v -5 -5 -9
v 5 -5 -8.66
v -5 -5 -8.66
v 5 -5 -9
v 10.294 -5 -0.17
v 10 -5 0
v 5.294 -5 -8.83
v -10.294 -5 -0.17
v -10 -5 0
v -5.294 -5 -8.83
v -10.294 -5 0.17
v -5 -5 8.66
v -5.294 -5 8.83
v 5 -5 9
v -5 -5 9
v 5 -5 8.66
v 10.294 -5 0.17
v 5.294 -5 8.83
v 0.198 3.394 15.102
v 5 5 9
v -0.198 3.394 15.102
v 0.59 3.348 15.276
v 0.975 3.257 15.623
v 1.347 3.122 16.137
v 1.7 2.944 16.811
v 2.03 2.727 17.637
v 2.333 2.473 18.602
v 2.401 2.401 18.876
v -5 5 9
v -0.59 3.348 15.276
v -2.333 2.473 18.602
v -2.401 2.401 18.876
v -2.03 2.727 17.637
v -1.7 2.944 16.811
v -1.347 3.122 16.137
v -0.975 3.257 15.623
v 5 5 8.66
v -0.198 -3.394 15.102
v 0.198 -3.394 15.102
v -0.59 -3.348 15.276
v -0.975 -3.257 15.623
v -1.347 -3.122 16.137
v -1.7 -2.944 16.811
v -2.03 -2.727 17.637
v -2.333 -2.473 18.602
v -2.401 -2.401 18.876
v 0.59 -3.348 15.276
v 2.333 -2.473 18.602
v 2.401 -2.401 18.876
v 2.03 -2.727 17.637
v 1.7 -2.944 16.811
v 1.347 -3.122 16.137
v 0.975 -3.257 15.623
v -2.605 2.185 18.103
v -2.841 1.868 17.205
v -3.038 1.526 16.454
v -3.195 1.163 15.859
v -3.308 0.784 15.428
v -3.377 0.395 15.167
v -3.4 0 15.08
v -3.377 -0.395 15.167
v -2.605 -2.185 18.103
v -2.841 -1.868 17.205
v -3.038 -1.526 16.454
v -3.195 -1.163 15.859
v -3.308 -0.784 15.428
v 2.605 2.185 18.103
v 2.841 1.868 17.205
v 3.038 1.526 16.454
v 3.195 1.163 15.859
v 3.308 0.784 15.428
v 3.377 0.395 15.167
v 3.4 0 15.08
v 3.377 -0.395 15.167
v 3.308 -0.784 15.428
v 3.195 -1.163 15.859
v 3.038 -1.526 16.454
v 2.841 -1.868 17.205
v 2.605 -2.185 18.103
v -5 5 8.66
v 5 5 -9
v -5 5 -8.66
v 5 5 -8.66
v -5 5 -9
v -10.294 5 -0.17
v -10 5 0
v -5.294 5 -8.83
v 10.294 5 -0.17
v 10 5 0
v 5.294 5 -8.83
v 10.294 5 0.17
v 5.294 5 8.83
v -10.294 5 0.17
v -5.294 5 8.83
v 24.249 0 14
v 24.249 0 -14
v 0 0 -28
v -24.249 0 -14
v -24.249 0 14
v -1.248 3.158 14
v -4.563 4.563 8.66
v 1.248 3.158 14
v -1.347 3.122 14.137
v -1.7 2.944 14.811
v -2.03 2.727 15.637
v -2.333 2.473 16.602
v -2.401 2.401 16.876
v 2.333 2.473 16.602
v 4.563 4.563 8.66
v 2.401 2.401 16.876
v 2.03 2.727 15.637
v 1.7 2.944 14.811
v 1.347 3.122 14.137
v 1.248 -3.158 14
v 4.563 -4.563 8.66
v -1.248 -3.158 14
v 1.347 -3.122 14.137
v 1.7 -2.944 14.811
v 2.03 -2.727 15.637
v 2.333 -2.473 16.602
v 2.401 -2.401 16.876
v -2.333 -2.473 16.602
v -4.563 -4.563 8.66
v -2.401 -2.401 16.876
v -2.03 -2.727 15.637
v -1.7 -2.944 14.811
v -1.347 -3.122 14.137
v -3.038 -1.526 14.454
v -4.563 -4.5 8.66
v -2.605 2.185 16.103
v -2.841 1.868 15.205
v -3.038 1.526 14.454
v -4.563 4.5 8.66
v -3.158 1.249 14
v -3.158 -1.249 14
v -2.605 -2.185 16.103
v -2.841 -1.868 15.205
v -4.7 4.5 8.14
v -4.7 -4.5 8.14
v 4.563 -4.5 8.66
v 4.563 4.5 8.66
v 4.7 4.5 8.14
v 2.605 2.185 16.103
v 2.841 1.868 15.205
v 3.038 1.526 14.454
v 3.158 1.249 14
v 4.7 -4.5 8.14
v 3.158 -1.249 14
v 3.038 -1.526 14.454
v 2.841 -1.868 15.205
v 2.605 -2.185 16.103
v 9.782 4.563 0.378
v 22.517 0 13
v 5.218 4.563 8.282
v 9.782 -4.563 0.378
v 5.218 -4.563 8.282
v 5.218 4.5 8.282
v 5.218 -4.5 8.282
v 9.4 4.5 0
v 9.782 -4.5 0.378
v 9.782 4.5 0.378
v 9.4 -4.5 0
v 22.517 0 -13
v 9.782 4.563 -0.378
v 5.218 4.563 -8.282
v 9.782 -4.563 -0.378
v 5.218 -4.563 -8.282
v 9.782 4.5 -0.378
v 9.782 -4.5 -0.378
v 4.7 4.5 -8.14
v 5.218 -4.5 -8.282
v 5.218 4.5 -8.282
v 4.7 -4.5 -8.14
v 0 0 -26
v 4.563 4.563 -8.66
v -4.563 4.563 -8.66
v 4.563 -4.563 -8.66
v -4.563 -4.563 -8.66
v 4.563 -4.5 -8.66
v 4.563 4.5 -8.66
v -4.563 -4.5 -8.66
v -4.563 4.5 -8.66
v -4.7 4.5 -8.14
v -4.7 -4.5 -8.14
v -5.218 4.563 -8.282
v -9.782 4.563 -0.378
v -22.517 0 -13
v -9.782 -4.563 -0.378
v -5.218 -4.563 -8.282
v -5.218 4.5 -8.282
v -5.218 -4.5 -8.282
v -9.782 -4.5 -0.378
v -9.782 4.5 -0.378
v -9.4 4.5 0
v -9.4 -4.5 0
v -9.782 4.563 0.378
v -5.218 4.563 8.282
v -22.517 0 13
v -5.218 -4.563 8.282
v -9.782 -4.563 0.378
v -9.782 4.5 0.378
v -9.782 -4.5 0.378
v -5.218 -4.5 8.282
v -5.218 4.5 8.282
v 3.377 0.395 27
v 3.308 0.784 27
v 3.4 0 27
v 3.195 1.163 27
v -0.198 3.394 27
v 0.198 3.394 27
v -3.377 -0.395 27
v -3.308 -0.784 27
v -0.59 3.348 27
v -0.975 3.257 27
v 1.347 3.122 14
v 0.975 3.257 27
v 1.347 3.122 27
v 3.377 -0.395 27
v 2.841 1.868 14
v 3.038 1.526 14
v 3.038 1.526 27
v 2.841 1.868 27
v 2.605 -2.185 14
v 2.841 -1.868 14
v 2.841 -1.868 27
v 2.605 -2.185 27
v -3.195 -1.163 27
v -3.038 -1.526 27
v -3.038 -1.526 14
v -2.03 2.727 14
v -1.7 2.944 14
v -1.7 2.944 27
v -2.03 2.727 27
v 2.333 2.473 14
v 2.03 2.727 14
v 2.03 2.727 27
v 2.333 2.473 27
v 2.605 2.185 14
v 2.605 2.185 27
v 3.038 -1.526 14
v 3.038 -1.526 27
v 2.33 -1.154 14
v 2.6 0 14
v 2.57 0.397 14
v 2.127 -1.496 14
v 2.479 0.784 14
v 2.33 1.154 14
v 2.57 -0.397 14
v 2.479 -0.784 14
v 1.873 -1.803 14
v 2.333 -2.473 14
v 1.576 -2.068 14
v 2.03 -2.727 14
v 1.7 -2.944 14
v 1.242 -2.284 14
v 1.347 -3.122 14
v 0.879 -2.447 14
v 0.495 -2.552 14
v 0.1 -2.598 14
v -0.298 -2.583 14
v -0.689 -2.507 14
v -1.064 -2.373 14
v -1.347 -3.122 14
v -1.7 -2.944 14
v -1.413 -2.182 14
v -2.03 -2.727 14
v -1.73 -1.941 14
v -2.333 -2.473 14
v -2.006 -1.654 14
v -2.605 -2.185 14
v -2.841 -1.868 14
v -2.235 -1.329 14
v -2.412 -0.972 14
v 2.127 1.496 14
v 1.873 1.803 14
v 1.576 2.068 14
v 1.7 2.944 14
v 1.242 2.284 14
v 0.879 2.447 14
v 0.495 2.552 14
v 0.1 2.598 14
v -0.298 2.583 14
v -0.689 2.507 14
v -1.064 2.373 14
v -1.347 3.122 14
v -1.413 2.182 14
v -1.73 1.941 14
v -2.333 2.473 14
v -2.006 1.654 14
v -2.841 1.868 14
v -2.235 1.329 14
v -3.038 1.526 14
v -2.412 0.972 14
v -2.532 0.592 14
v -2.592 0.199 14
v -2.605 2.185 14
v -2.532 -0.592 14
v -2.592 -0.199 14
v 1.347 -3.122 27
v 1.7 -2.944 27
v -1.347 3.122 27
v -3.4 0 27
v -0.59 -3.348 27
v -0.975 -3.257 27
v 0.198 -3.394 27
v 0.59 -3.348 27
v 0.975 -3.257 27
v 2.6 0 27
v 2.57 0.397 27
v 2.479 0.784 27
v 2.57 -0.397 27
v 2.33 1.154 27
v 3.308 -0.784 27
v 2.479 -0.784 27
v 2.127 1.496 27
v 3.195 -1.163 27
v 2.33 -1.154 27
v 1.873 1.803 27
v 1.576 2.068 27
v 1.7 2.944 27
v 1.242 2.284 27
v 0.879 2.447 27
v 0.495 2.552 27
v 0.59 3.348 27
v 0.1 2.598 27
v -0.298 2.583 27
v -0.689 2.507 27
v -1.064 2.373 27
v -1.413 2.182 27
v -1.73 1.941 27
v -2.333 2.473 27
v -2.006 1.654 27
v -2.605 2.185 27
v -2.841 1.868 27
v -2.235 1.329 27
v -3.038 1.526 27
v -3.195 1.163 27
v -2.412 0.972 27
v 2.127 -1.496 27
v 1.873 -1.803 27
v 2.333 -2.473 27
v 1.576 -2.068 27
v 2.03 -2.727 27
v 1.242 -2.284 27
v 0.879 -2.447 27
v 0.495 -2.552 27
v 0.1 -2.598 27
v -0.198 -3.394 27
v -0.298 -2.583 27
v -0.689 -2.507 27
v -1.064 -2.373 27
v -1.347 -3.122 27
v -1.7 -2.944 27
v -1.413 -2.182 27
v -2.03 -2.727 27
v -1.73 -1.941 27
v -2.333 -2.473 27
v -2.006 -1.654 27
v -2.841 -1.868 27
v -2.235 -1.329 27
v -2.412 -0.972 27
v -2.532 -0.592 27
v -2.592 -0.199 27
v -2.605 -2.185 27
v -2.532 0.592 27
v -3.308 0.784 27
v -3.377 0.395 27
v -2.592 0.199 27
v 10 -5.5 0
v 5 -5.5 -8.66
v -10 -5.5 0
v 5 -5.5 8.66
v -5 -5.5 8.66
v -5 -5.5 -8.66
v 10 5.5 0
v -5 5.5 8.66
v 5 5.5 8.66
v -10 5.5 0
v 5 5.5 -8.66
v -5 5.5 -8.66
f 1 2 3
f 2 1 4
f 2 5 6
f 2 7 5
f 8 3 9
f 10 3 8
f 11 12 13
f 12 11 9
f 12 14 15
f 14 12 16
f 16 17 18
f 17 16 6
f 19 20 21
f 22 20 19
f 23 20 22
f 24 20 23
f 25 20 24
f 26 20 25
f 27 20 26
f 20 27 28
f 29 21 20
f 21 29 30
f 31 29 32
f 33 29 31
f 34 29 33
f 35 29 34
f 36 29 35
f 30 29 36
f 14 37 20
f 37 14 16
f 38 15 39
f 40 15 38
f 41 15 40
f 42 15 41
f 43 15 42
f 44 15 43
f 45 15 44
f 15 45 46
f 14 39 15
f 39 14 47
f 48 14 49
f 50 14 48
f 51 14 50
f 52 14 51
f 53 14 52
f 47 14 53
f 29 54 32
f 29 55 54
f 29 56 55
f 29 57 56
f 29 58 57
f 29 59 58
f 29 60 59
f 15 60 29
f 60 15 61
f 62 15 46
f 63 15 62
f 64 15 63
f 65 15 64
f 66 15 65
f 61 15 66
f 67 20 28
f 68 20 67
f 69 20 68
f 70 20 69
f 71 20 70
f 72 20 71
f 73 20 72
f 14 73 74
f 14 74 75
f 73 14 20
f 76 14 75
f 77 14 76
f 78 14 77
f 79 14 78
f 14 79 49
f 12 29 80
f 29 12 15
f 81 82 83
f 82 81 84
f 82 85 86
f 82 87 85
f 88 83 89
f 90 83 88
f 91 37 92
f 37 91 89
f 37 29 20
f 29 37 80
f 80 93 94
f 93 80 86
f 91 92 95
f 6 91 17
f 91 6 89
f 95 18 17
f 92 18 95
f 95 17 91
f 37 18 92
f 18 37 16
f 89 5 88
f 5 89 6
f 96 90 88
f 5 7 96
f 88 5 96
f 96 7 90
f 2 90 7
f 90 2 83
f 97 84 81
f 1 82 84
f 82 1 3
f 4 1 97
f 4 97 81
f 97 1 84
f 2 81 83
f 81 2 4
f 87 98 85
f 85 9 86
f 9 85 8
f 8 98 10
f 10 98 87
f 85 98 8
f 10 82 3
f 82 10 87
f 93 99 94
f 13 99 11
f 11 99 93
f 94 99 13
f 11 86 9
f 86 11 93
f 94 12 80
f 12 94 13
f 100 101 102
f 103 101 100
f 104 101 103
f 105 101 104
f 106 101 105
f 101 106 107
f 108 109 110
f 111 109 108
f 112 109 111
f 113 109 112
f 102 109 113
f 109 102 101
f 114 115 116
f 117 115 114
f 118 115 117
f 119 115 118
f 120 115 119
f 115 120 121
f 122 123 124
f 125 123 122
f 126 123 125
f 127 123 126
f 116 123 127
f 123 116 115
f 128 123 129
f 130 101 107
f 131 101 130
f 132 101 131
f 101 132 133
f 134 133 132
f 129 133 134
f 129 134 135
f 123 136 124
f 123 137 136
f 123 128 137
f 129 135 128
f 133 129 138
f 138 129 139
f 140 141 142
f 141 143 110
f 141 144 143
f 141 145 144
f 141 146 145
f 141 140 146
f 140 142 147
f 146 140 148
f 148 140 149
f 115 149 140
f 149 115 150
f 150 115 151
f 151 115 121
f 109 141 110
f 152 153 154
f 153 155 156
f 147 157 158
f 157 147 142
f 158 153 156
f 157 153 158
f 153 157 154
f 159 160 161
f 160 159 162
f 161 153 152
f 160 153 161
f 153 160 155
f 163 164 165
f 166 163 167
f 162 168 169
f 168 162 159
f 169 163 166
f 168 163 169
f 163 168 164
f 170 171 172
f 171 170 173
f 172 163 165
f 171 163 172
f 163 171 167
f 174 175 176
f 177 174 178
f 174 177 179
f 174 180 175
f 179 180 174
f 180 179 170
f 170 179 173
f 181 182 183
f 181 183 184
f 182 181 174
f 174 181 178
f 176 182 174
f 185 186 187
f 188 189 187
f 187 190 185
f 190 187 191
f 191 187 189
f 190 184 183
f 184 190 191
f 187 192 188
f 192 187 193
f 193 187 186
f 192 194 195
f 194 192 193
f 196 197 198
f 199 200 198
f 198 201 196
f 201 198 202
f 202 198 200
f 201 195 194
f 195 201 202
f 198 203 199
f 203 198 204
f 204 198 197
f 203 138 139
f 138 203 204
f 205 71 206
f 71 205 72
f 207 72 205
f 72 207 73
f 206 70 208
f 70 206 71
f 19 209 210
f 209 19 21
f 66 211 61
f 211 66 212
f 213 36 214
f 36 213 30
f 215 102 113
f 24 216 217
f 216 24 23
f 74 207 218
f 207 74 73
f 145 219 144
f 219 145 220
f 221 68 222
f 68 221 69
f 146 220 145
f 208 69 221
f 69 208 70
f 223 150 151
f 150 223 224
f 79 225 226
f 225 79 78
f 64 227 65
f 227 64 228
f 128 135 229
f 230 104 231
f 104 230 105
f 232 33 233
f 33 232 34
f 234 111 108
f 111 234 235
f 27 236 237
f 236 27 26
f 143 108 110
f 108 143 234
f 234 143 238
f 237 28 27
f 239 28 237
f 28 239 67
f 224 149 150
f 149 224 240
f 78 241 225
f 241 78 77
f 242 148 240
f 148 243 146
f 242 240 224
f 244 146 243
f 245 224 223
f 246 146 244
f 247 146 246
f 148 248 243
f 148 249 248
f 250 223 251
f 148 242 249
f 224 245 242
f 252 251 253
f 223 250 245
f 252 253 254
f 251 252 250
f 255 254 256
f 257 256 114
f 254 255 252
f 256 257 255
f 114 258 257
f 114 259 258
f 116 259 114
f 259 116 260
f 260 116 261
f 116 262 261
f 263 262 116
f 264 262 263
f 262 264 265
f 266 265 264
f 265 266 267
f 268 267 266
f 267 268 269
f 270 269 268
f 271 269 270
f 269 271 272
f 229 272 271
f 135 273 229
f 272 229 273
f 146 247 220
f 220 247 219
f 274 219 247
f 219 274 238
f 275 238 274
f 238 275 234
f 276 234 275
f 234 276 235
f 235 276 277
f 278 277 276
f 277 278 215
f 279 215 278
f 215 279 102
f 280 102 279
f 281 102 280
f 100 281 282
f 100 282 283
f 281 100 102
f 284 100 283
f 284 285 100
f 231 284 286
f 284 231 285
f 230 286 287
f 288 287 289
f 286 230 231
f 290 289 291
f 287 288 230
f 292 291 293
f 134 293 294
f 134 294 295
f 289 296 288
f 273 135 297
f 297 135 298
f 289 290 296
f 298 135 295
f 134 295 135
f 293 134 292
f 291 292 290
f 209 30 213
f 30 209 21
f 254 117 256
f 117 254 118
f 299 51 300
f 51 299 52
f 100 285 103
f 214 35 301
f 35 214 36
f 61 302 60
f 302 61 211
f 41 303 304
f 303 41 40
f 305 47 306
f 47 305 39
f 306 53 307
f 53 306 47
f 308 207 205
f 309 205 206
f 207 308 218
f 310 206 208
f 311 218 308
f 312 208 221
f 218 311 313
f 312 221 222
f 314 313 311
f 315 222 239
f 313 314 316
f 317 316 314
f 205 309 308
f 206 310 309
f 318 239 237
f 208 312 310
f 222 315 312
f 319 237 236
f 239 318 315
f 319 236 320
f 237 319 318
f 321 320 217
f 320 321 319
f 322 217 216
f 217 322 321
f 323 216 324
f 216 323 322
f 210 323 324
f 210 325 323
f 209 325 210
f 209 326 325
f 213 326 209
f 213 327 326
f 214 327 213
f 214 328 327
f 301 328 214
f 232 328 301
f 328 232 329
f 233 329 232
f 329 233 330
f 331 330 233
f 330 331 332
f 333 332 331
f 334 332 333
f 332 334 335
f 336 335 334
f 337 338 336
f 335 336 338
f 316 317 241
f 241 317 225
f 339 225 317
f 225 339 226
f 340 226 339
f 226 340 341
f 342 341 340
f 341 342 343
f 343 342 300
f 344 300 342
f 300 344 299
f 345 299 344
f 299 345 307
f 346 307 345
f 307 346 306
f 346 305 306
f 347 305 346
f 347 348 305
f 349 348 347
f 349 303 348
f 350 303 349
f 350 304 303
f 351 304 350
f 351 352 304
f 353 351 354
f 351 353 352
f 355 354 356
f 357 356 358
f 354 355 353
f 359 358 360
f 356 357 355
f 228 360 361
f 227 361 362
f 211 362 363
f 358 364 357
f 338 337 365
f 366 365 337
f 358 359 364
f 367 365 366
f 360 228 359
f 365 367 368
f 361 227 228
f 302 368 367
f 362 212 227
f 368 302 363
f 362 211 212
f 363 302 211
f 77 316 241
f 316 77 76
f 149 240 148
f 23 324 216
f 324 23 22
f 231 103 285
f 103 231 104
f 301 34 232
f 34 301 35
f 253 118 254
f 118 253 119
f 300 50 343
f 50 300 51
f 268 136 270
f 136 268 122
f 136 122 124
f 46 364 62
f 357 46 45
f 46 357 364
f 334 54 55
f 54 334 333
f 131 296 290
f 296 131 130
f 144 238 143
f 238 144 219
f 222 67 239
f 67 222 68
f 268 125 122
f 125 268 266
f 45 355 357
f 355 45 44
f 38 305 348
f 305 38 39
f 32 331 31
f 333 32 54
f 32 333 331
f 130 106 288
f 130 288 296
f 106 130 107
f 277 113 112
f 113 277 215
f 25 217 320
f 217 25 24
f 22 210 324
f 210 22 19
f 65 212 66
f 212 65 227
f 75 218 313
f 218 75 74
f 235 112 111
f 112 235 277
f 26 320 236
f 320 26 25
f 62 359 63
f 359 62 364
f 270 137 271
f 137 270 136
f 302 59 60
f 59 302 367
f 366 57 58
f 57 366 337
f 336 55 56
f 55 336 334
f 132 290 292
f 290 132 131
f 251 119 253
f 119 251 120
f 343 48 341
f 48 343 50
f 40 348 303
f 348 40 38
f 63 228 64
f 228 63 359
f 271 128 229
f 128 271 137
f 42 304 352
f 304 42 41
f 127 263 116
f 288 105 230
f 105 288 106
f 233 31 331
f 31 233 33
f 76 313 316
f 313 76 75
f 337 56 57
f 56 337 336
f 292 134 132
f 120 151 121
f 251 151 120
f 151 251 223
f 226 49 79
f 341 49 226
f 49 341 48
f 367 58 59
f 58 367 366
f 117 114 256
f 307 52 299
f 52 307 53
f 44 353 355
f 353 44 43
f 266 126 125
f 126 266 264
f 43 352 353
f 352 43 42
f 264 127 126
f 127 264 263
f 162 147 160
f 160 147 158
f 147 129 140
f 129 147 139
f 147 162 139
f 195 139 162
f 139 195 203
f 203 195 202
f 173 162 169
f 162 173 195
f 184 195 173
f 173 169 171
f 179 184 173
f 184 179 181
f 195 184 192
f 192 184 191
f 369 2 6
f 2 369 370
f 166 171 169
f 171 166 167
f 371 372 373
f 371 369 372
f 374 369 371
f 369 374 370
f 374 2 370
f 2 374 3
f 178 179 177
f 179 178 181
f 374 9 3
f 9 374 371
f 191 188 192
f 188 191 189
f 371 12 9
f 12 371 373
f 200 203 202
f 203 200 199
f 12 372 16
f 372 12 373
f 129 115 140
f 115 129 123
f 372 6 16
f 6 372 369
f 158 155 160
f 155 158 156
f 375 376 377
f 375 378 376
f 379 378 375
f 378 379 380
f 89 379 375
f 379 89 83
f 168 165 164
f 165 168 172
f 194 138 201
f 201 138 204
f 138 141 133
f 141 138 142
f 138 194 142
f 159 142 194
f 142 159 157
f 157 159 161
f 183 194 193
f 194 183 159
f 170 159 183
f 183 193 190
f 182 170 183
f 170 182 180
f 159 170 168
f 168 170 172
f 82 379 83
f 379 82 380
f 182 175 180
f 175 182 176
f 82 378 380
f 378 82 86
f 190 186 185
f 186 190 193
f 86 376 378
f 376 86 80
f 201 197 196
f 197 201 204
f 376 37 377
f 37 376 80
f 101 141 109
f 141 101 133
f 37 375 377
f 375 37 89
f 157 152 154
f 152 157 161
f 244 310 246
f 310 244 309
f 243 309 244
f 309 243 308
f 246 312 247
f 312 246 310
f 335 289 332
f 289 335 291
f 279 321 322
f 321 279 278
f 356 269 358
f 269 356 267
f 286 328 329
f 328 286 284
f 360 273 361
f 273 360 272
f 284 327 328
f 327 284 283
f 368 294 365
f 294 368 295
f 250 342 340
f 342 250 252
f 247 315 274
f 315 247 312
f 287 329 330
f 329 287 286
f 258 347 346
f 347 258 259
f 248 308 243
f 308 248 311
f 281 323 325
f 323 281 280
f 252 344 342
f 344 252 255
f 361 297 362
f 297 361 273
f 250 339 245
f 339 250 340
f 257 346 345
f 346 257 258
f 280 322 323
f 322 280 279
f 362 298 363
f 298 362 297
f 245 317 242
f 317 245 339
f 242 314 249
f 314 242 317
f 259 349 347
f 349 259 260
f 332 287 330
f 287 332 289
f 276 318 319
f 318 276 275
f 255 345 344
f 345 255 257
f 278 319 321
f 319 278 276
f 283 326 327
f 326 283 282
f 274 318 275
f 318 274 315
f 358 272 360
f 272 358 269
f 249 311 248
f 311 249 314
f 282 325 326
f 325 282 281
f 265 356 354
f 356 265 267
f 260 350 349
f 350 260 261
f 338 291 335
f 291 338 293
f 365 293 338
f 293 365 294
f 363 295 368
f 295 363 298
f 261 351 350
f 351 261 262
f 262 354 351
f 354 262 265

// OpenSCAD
$fa = 4;
$fs = 0.4;

module regular_polygon(height = 2, order = 4, r = 1){
  angles=[ for (i = [0:order-1]) i*(360/order) ];
  coords=[ for (th=angles) [r*cos(th), r*sin(th)] ];
  linear_extrude(height) polygon(coords);
}


//translate([0, 0, -.5])cylinder(1, 25, 25);

/*
linear_extrude(height = 60, twist = 90, slices = 60) {
   difference() {
     offset(r = 10) {
      square(20, center = true);
     }
     offset(r = 8) {
       square(20, center = true);
     }
   }
 }
*/
/*
// sphere
difference(){
union(){
  resize([36, 36, 15])
  difference(){
    sphere(18);
    sphere(16);
    
    //translate([0, 0, -20])
    //cylinder(50, 10, 10);
  }

  translate([16, 0, 0])
  rotate([0, 90, 0])
  cylinder(5, 3, 3);
}

  translate([14, 0, 0])
  rotate([0, 90, 0])
  cylinder(10, 2.6, 2.6);

  
  //translate([0, 0, -2])
  //cylinder(20, 10, 10);
}
*/

/*
// 5 angle
difference(){
  
  union(){
  hull() {
    regular_polygon(height = 8, order = 5, r = 18);
    translate([0, 0, -1])
      regular_polygon(height = 10, order = 5, r = 17);
  }
  translate([13, 0, 4])
  rotate([0, 90, 0])
  cylinder(8, 3, 3);
  }
  
  regular_polygon(height = 8, order = 5, r = 16);

  translate([12, 0, 4])
  rotate([0, 90, 0])
  cylinder(10, 2.6, 2.6);
  
  //translate([0, 0, -2])
  //cylinder(20, 10, 10);
}
*/

/*
// star 6
difference(){
star6();
translate([18, 0, 4])
  rotate([0, 90, 0])
  cylinder(10, 2.6, 2.6);
}
*/
module star5() {

  translate([13, 0, 4])
  rotate([0, 90, 0])
  cylinder(8, 3, 3);

  for(i = [0: 360/5:360])
  rotate([0, 0, i])
  translate([11.2, 0, 0])
  difference(){
    regular_polygon(height = 8, order = 3, r = 7);
    translate([-.5, 0, -1])
    regular_polygon(height = 10, order = 3, r = 6.5);
  }

  translate([0, 0, -1])
  for(i = [0: 360/5:360])
  rotate([0, 0, i])
  translate([11.2, 0, 0])
  regular_polygon(height = 1, order = 3, r = 7);
  
  translate([0, 0, -1])
  regular_polygon(height = 1, order = 5, r = 12);

  translate([0, 0, 8])
  for(i = [0: 360/5:360])
  rotate([0, 0, i])
  translate([11.2, 0, 0])
  regular_polygon(height = 1, order = 3, r = 7);
  
  translate([0, 0, 8])
  regular_polygon(height = 1, order = 5, r = 12);
  
}

module star6() {

  translate([19, 0, 4])
  rotate([0, 90, 0])
  cylinder(8, 4, 4);

  for(i = [0: 360/6:360])
  rotate([0, 0, i])
  translate([17, 0, 0])
  difference(){
    regular_polygon(height = 8, order = 3, r = 9);
    translate([-.5, 0, -1])
    regular_polygon(height = 10, order = 3, r = 8.2);
  }

  translate([0, 0, -1])
  for(i = [0: 360/6:360])
  rotate([0, 0, i])
  translate([17, 0, 0])
  regular_polygon(height = 1, order = 3, r = 9);
  
  translate([0, 0, -1])
  regular_polygon(height = 1, order = 6, r = 17);

  translate([0, 0, 8])
  for(i = [0: 360/6:360])
  rotate([0, 0, i])
  translate([17, 0, 0])
  regular_polygon(height = 1, order = 3, r = 9);
  
  translate([0, 0, 8])
  regular_polygon(height = 1, order = 6, r = 17);
}



// star 2 
//difference(){
difference(){
   star2(6, 0);
   //star2(7, 38);
   //star2(8, 0);
   //star2(9, 10);
   //star2(10, 0);
   translate([0, 0, 13]) cylinder(15, 2.6, 2.6);
}
//translate([-30, -10, -30])cube([60, 10, 60]);//
//}

module star2(num = 6, rot = 0) {
translate([0, 0, 14])
  cylinder(13, 3.4, 3.4);

difference(){
for(i = [0: 360/num:360])
  rotate([0, i, 0])
  translate([0, 0, 8])
   hull(){
      cylinder(20, 5, 0);
      translate([-5, -5, 0]) cube([10, 10, 1]);
   }

for(i = [0: 360/num:360])
  rotate([0, i, 0])
  translate([0, 0, 6])
   hull(){
      cylinder(20, 5, 0);
      translate([-5, -5, 0]) cube([10, 10, 1]);
   }
}
   
translate([0, -4.5, 0])   
   rotate([90, rot, 0])
      regular_polygon(height = 1, order = num, r = 10);
   
translate([0, 5.5, 0])   
   rotate([90, rot, 0])
      regular_polygon(height = 1, order = num, r = 10);
}


//resize([50, 20, 50]) pine();

module pine() {
  translate([0, 0, 30]) cylinder(15 , 10, 0);
  translate([0, 0, 20]) cylinder(20 , 15, 0);
  translate([0, 0, 10]) cylinder(25 , 20, 0);
  translate([0, 0, 0]) cylinder(30 , 25, 0);
}
/*
difference(){
   cylinder(50, 5, 5);
   cylinder(45, 4.4, 4.2);
}
translate([0, 0, 50])sphere(5);
*/
